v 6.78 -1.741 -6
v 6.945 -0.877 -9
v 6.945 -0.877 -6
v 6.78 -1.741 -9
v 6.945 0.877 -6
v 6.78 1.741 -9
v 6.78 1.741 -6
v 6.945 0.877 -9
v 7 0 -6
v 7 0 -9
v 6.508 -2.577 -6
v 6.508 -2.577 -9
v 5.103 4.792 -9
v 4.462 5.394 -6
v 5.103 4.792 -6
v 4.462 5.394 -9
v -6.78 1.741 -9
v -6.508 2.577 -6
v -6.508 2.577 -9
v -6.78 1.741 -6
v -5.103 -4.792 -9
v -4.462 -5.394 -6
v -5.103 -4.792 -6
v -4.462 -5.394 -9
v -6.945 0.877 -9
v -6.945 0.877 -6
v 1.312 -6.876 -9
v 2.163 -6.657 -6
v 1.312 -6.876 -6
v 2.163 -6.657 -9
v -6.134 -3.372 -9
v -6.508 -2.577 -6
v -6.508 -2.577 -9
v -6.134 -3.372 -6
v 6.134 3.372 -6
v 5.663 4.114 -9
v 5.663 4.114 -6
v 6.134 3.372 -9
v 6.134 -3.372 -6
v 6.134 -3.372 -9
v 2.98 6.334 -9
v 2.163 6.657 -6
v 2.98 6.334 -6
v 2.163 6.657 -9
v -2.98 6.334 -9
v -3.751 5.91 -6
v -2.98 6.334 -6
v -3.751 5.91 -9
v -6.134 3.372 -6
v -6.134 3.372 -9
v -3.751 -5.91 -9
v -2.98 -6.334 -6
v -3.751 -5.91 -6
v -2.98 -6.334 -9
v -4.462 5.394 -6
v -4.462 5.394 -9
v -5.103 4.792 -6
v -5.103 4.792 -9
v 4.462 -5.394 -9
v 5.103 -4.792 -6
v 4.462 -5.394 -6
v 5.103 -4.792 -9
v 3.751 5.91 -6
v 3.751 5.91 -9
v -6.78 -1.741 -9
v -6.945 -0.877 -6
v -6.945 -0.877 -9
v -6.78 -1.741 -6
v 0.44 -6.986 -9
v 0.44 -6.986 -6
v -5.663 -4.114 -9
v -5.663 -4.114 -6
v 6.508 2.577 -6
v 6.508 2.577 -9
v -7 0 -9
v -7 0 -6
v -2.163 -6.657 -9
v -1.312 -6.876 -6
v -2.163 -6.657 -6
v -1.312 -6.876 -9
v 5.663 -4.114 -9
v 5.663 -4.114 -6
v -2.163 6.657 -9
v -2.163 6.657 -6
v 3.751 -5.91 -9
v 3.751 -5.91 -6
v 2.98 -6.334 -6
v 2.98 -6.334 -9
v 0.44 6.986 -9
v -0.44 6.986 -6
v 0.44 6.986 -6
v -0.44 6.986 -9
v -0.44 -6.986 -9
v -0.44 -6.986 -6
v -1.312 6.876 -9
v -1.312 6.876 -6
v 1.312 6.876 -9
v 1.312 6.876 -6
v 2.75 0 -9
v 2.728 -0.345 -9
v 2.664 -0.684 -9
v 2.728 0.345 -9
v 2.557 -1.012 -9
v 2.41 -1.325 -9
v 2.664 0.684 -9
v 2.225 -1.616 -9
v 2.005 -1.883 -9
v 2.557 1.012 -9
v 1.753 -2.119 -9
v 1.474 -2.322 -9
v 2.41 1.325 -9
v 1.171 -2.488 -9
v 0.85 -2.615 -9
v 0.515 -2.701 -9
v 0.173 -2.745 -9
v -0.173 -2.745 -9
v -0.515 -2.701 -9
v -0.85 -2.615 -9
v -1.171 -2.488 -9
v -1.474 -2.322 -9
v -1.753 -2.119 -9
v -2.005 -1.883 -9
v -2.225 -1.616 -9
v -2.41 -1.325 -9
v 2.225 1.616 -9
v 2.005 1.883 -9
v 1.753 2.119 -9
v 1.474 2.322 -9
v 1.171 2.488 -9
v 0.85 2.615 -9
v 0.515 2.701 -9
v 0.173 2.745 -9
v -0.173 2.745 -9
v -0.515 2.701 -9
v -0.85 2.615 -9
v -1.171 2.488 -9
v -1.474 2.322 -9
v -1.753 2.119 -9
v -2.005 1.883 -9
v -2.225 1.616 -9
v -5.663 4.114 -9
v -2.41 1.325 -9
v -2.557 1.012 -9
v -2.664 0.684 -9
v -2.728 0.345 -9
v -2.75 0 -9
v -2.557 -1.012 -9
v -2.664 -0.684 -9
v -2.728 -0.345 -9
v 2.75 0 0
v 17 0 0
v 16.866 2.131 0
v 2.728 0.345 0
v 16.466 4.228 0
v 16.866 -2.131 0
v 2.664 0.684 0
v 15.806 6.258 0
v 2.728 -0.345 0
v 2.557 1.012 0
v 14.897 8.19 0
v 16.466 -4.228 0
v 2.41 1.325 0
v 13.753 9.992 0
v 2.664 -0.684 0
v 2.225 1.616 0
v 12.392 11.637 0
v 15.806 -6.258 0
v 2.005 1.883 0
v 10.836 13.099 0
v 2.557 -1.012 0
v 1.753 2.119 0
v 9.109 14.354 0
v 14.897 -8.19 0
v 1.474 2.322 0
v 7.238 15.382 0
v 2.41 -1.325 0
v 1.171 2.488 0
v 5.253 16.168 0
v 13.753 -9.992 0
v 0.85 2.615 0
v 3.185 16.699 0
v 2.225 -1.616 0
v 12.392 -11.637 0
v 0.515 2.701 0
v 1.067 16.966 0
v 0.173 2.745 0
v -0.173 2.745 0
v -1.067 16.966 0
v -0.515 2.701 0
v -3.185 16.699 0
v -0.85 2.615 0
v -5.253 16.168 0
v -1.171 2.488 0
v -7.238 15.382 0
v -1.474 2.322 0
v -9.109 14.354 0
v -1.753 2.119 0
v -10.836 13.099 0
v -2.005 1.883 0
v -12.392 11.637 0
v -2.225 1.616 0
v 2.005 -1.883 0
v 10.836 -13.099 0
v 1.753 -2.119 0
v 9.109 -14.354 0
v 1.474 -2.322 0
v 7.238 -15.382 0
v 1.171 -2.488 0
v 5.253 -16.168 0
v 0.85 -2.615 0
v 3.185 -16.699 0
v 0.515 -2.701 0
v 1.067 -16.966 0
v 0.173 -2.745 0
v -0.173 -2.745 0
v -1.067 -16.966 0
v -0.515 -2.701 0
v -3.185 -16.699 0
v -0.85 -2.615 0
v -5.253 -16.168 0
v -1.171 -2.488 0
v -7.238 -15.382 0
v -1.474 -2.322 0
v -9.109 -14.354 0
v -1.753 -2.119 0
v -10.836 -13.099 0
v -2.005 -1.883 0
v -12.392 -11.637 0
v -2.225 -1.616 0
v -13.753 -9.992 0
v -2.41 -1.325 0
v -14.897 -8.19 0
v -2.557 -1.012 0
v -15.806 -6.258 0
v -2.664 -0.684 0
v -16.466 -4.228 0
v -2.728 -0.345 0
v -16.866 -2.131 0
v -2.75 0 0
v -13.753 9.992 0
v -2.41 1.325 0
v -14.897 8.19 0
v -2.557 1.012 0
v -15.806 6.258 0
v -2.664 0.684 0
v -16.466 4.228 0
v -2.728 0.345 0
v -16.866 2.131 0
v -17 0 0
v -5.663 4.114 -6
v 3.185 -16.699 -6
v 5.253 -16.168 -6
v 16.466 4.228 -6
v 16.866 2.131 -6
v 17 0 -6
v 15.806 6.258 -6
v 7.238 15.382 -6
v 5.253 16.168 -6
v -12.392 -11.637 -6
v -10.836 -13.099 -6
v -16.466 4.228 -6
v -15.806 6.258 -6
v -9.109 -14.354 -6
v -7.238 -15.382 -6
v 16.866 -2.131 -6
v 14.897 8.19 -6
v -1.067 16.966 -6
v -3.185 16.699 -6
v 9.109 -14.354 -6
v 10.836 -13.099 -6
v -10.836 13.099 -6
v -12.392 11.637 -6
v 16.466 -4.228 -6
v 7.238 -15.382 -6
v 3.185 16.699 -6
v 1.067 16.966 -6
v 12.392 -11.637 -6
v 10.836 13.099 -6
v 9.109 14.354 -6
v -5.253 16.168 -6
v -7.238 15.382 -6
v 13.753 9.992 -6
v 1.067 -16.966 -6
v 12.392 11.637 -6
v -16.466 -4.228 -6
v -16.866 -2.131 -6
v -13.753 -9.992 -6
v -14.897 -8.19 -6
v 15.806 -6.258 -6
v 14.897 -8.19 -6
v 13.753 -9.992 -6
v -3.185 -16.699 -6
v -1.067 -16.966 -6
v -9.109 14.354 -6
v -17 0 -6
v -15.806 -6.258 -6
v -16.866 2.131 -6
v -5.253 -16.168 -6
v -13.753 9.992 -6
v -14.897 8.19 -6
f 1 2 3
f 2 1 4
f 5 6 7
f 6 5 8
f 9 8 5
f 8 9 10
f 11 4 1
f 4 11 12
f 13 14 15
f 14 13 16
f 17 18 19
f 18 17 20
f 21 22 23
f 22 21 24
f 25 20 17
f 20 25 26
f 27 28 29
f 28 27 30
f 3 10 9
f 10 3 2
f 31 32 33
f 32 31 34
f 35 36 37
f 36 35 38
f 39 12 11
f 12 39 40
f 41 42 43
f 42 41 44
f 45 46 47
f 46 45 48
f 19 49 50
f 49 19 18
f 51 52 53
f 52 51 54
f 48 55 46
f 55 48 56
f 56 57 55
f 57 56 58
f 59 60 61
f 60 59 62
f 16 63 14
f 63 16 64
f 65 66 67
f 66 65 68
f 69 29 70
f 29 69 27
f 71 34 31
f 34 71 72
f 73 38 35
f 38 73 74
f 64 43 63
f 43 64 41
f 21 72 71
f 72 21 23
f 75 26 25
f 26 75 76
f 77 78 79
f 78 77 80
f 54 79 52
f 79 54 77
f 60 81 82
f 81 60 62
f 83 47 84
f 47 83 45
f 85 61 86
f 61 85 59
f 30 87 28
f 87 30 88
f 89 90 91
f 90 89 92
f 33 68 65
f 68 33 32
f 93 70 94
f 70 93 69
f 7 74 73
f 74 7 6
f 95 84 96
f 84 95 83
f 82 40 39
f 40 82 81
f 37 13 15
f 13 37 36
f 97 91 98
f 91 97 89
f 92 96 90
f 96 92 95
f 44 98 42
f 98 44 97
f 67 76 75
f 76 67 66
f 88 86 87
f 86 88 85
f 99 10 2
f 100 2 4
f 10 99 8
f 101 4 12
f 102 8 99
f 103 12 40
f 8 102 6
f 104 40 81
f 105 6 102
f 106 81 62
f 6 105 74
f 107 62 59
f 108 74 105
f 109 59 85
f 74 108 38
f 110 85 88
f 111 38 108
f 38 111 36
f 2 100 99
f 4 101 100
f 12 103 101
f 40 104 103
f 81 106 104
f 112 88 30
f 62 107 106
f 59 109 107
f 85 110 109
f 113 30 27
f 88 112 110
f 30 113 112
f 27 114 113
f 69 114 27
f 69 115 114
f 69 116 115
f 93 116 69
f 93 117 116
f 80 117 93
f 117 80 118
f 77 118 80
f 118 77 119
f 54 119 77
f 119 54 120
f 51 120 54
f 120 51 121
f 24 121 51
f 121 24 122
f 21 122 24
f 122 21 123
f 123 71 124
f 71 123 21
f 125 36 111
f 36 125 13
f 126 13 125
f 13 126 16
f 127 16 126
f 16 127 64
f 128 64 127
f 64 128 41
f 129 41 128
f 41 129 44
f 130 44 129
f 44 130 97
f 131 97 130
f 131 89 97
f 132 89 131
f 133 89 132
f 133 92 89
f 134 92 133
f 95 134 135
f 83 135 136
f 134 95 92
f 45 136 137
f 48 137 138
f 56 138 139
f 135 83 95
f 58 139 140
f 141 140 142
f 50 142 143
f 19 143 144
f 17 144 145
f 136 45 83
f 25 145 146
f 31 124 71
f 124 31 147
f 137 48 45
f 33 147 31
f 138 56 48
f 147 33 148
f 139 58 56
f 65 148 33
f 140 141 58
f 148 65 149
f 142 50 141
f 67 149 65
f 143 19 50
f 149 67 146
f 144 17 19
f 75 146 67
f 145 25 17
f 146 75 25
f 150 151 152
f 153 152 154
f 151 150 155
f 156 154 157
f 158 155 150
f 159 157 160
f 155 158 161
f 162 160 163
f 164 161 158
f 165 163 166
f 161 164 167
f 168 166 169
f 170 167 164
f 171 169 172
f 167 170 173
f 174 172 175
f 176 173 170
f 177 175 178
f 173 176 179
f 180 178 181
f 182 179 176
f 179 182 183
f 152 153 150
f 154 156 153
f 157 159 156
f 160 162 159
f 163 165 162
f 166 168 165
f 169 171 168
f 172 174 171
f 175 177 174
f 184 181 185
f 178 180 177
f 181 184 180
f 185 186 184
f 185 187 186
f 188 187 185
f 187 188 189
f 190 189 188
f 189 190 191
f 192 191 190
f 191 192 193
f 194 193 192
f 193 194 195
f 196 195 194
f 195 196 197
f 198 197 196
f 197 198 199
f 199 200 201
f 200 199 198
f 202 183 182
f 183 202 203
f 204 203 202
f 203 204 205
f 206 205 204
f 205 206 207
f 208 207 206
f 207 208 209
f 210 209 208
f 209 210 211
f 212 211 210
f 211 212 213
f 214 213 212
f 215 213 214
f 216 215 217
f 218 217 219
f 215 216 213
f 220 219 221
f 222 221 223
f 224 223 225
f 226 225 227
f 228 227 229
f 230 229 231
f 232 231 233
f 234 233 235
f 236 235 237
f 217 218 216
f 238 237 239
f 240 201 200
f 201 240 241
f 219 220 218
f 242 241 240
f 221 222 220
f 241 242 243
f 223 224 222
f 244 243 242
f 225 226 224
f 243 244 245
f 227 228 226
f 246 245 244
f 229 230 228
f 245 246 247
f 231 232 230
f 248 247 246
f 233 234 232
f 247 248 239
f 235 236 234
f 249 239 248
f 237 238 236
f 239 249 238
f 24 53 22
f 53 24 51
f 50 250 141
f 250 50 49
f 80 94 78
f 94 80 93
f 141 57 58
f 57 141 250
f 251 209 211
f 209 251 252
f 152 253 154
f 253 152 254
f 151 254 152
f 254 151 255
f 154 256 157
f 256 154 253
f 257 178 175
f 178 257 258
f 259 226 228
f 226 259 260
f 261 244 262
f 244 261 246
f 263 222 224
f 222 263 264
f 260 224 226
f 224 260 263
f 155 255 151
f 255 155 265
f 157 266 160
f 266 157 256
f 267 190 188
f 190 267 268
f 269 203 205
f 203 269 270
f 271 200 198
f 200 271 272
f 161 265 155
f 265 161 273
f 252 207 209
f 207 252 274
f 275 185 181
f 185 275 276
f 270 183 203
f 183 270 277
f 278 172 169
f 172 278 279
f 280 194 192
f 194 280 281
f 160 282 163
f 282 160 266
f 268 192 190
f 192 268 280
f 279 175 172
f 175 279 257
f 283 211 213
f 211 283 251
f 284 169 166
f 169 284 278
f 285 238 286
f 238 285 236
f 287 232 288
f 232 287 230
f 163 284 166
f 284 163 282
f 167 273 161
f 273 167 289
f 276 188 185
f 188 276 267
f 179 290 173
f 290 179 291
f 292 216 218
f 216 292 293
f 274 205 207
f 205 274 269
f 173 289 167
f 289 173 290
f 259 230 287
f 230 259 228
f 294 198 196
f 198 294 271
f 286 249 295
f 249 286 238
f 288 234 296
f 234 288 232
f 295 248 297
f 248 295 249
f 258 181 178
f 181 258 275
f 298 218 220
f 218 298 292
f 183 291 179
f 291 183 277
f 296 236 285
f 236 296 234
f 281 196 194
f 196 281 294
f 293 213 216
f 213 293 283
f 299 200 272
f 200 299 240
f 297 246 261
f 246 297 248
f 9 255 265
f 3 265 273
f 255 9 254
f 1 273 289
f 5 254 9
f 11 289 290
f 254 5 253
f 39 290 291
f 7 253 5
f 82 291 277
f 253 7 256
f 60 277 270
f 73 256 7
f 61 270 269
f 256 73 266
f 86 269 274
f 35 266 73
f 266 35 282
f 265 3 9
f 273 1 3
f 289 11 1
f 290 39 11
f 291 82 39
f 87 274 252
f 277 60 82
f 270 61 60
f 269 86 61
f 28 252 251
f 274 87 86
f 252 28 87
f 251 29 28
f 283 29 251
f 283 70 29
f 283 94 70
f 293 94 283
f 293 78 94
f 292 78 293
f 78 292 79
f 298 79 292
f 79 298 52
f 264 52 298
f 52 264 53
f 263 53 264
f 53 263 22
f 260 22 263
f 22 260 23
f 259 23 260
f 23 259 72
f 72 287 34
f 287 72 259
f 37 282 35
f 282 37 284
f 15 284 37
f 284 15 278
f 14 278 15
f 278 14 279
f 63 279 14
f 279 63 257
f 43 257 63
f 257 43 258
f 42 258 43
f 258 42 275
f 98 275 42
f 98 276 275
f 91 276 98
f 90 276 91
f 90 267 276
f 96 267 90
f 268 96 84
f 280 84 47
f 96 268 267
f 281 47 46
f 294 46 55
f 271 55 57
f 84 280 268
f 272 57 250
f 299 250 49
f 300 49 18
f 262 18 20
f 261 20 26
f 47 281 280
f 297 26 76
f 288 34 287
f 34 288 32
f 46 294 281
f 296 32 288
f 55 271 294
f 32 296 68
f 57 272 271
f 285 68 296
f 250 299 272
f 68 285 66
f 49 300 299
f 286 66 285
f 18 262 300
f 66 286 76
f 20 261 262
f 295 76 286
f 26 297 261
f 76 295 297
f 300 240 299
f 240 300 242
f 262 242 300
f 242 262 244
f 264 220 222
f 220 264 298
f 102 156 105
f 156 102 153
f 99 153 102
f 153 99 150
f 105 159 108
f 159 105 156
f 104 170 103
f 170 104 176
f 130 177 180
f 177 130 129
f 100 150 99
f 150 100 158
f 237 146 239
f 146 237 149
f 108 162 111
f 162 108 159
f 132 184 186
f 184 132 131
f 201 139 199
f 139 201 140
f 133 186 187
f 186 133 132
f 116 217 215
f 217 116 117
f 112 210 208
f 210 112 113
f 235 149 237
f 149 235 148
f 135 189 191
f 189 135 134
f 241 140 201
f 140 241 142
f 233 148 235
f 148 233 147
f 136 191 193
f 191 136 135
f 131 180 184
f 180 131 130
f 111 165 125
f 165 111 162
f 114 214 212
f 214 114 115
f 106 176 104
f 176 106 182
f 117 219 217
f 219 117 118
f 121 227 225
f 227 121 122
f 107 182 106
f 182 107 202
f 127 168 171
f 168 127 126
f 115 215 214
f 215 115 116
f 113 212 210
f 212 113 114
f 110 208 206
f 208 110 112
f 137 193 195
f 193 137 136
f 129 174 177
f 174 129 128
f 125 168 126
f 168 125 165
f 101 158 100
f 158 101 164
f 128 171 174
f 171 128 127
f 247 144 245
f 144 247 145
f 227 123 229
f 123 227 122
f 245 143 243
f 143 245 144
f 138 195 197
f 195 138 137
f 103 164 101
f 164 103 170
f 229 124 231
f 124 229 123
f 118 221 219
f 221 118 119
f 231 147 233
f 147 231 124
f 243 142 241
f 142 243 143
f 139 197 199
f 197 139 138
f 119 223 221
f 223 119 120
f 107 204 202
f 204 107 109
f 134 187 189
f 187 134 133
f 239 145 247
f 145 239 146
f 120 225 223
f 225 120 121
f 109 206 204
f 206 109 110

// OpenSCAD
$fn = 50;


difference() {
	union() {
		translate(v = [0, 0, -9.0000000000]) {
			cylinder(h = 9, r = 7.0000000000);
		}
		translate(v = [0, 0, -6.0000000000]) {
			cylinder(h = 6, r = 17.0000000000);
		}
	}
	union() {
		#translate(v = [0, 0, -9]) {
			cylinder(h = 9, r = 2.7500000000);
		}
	}
}
